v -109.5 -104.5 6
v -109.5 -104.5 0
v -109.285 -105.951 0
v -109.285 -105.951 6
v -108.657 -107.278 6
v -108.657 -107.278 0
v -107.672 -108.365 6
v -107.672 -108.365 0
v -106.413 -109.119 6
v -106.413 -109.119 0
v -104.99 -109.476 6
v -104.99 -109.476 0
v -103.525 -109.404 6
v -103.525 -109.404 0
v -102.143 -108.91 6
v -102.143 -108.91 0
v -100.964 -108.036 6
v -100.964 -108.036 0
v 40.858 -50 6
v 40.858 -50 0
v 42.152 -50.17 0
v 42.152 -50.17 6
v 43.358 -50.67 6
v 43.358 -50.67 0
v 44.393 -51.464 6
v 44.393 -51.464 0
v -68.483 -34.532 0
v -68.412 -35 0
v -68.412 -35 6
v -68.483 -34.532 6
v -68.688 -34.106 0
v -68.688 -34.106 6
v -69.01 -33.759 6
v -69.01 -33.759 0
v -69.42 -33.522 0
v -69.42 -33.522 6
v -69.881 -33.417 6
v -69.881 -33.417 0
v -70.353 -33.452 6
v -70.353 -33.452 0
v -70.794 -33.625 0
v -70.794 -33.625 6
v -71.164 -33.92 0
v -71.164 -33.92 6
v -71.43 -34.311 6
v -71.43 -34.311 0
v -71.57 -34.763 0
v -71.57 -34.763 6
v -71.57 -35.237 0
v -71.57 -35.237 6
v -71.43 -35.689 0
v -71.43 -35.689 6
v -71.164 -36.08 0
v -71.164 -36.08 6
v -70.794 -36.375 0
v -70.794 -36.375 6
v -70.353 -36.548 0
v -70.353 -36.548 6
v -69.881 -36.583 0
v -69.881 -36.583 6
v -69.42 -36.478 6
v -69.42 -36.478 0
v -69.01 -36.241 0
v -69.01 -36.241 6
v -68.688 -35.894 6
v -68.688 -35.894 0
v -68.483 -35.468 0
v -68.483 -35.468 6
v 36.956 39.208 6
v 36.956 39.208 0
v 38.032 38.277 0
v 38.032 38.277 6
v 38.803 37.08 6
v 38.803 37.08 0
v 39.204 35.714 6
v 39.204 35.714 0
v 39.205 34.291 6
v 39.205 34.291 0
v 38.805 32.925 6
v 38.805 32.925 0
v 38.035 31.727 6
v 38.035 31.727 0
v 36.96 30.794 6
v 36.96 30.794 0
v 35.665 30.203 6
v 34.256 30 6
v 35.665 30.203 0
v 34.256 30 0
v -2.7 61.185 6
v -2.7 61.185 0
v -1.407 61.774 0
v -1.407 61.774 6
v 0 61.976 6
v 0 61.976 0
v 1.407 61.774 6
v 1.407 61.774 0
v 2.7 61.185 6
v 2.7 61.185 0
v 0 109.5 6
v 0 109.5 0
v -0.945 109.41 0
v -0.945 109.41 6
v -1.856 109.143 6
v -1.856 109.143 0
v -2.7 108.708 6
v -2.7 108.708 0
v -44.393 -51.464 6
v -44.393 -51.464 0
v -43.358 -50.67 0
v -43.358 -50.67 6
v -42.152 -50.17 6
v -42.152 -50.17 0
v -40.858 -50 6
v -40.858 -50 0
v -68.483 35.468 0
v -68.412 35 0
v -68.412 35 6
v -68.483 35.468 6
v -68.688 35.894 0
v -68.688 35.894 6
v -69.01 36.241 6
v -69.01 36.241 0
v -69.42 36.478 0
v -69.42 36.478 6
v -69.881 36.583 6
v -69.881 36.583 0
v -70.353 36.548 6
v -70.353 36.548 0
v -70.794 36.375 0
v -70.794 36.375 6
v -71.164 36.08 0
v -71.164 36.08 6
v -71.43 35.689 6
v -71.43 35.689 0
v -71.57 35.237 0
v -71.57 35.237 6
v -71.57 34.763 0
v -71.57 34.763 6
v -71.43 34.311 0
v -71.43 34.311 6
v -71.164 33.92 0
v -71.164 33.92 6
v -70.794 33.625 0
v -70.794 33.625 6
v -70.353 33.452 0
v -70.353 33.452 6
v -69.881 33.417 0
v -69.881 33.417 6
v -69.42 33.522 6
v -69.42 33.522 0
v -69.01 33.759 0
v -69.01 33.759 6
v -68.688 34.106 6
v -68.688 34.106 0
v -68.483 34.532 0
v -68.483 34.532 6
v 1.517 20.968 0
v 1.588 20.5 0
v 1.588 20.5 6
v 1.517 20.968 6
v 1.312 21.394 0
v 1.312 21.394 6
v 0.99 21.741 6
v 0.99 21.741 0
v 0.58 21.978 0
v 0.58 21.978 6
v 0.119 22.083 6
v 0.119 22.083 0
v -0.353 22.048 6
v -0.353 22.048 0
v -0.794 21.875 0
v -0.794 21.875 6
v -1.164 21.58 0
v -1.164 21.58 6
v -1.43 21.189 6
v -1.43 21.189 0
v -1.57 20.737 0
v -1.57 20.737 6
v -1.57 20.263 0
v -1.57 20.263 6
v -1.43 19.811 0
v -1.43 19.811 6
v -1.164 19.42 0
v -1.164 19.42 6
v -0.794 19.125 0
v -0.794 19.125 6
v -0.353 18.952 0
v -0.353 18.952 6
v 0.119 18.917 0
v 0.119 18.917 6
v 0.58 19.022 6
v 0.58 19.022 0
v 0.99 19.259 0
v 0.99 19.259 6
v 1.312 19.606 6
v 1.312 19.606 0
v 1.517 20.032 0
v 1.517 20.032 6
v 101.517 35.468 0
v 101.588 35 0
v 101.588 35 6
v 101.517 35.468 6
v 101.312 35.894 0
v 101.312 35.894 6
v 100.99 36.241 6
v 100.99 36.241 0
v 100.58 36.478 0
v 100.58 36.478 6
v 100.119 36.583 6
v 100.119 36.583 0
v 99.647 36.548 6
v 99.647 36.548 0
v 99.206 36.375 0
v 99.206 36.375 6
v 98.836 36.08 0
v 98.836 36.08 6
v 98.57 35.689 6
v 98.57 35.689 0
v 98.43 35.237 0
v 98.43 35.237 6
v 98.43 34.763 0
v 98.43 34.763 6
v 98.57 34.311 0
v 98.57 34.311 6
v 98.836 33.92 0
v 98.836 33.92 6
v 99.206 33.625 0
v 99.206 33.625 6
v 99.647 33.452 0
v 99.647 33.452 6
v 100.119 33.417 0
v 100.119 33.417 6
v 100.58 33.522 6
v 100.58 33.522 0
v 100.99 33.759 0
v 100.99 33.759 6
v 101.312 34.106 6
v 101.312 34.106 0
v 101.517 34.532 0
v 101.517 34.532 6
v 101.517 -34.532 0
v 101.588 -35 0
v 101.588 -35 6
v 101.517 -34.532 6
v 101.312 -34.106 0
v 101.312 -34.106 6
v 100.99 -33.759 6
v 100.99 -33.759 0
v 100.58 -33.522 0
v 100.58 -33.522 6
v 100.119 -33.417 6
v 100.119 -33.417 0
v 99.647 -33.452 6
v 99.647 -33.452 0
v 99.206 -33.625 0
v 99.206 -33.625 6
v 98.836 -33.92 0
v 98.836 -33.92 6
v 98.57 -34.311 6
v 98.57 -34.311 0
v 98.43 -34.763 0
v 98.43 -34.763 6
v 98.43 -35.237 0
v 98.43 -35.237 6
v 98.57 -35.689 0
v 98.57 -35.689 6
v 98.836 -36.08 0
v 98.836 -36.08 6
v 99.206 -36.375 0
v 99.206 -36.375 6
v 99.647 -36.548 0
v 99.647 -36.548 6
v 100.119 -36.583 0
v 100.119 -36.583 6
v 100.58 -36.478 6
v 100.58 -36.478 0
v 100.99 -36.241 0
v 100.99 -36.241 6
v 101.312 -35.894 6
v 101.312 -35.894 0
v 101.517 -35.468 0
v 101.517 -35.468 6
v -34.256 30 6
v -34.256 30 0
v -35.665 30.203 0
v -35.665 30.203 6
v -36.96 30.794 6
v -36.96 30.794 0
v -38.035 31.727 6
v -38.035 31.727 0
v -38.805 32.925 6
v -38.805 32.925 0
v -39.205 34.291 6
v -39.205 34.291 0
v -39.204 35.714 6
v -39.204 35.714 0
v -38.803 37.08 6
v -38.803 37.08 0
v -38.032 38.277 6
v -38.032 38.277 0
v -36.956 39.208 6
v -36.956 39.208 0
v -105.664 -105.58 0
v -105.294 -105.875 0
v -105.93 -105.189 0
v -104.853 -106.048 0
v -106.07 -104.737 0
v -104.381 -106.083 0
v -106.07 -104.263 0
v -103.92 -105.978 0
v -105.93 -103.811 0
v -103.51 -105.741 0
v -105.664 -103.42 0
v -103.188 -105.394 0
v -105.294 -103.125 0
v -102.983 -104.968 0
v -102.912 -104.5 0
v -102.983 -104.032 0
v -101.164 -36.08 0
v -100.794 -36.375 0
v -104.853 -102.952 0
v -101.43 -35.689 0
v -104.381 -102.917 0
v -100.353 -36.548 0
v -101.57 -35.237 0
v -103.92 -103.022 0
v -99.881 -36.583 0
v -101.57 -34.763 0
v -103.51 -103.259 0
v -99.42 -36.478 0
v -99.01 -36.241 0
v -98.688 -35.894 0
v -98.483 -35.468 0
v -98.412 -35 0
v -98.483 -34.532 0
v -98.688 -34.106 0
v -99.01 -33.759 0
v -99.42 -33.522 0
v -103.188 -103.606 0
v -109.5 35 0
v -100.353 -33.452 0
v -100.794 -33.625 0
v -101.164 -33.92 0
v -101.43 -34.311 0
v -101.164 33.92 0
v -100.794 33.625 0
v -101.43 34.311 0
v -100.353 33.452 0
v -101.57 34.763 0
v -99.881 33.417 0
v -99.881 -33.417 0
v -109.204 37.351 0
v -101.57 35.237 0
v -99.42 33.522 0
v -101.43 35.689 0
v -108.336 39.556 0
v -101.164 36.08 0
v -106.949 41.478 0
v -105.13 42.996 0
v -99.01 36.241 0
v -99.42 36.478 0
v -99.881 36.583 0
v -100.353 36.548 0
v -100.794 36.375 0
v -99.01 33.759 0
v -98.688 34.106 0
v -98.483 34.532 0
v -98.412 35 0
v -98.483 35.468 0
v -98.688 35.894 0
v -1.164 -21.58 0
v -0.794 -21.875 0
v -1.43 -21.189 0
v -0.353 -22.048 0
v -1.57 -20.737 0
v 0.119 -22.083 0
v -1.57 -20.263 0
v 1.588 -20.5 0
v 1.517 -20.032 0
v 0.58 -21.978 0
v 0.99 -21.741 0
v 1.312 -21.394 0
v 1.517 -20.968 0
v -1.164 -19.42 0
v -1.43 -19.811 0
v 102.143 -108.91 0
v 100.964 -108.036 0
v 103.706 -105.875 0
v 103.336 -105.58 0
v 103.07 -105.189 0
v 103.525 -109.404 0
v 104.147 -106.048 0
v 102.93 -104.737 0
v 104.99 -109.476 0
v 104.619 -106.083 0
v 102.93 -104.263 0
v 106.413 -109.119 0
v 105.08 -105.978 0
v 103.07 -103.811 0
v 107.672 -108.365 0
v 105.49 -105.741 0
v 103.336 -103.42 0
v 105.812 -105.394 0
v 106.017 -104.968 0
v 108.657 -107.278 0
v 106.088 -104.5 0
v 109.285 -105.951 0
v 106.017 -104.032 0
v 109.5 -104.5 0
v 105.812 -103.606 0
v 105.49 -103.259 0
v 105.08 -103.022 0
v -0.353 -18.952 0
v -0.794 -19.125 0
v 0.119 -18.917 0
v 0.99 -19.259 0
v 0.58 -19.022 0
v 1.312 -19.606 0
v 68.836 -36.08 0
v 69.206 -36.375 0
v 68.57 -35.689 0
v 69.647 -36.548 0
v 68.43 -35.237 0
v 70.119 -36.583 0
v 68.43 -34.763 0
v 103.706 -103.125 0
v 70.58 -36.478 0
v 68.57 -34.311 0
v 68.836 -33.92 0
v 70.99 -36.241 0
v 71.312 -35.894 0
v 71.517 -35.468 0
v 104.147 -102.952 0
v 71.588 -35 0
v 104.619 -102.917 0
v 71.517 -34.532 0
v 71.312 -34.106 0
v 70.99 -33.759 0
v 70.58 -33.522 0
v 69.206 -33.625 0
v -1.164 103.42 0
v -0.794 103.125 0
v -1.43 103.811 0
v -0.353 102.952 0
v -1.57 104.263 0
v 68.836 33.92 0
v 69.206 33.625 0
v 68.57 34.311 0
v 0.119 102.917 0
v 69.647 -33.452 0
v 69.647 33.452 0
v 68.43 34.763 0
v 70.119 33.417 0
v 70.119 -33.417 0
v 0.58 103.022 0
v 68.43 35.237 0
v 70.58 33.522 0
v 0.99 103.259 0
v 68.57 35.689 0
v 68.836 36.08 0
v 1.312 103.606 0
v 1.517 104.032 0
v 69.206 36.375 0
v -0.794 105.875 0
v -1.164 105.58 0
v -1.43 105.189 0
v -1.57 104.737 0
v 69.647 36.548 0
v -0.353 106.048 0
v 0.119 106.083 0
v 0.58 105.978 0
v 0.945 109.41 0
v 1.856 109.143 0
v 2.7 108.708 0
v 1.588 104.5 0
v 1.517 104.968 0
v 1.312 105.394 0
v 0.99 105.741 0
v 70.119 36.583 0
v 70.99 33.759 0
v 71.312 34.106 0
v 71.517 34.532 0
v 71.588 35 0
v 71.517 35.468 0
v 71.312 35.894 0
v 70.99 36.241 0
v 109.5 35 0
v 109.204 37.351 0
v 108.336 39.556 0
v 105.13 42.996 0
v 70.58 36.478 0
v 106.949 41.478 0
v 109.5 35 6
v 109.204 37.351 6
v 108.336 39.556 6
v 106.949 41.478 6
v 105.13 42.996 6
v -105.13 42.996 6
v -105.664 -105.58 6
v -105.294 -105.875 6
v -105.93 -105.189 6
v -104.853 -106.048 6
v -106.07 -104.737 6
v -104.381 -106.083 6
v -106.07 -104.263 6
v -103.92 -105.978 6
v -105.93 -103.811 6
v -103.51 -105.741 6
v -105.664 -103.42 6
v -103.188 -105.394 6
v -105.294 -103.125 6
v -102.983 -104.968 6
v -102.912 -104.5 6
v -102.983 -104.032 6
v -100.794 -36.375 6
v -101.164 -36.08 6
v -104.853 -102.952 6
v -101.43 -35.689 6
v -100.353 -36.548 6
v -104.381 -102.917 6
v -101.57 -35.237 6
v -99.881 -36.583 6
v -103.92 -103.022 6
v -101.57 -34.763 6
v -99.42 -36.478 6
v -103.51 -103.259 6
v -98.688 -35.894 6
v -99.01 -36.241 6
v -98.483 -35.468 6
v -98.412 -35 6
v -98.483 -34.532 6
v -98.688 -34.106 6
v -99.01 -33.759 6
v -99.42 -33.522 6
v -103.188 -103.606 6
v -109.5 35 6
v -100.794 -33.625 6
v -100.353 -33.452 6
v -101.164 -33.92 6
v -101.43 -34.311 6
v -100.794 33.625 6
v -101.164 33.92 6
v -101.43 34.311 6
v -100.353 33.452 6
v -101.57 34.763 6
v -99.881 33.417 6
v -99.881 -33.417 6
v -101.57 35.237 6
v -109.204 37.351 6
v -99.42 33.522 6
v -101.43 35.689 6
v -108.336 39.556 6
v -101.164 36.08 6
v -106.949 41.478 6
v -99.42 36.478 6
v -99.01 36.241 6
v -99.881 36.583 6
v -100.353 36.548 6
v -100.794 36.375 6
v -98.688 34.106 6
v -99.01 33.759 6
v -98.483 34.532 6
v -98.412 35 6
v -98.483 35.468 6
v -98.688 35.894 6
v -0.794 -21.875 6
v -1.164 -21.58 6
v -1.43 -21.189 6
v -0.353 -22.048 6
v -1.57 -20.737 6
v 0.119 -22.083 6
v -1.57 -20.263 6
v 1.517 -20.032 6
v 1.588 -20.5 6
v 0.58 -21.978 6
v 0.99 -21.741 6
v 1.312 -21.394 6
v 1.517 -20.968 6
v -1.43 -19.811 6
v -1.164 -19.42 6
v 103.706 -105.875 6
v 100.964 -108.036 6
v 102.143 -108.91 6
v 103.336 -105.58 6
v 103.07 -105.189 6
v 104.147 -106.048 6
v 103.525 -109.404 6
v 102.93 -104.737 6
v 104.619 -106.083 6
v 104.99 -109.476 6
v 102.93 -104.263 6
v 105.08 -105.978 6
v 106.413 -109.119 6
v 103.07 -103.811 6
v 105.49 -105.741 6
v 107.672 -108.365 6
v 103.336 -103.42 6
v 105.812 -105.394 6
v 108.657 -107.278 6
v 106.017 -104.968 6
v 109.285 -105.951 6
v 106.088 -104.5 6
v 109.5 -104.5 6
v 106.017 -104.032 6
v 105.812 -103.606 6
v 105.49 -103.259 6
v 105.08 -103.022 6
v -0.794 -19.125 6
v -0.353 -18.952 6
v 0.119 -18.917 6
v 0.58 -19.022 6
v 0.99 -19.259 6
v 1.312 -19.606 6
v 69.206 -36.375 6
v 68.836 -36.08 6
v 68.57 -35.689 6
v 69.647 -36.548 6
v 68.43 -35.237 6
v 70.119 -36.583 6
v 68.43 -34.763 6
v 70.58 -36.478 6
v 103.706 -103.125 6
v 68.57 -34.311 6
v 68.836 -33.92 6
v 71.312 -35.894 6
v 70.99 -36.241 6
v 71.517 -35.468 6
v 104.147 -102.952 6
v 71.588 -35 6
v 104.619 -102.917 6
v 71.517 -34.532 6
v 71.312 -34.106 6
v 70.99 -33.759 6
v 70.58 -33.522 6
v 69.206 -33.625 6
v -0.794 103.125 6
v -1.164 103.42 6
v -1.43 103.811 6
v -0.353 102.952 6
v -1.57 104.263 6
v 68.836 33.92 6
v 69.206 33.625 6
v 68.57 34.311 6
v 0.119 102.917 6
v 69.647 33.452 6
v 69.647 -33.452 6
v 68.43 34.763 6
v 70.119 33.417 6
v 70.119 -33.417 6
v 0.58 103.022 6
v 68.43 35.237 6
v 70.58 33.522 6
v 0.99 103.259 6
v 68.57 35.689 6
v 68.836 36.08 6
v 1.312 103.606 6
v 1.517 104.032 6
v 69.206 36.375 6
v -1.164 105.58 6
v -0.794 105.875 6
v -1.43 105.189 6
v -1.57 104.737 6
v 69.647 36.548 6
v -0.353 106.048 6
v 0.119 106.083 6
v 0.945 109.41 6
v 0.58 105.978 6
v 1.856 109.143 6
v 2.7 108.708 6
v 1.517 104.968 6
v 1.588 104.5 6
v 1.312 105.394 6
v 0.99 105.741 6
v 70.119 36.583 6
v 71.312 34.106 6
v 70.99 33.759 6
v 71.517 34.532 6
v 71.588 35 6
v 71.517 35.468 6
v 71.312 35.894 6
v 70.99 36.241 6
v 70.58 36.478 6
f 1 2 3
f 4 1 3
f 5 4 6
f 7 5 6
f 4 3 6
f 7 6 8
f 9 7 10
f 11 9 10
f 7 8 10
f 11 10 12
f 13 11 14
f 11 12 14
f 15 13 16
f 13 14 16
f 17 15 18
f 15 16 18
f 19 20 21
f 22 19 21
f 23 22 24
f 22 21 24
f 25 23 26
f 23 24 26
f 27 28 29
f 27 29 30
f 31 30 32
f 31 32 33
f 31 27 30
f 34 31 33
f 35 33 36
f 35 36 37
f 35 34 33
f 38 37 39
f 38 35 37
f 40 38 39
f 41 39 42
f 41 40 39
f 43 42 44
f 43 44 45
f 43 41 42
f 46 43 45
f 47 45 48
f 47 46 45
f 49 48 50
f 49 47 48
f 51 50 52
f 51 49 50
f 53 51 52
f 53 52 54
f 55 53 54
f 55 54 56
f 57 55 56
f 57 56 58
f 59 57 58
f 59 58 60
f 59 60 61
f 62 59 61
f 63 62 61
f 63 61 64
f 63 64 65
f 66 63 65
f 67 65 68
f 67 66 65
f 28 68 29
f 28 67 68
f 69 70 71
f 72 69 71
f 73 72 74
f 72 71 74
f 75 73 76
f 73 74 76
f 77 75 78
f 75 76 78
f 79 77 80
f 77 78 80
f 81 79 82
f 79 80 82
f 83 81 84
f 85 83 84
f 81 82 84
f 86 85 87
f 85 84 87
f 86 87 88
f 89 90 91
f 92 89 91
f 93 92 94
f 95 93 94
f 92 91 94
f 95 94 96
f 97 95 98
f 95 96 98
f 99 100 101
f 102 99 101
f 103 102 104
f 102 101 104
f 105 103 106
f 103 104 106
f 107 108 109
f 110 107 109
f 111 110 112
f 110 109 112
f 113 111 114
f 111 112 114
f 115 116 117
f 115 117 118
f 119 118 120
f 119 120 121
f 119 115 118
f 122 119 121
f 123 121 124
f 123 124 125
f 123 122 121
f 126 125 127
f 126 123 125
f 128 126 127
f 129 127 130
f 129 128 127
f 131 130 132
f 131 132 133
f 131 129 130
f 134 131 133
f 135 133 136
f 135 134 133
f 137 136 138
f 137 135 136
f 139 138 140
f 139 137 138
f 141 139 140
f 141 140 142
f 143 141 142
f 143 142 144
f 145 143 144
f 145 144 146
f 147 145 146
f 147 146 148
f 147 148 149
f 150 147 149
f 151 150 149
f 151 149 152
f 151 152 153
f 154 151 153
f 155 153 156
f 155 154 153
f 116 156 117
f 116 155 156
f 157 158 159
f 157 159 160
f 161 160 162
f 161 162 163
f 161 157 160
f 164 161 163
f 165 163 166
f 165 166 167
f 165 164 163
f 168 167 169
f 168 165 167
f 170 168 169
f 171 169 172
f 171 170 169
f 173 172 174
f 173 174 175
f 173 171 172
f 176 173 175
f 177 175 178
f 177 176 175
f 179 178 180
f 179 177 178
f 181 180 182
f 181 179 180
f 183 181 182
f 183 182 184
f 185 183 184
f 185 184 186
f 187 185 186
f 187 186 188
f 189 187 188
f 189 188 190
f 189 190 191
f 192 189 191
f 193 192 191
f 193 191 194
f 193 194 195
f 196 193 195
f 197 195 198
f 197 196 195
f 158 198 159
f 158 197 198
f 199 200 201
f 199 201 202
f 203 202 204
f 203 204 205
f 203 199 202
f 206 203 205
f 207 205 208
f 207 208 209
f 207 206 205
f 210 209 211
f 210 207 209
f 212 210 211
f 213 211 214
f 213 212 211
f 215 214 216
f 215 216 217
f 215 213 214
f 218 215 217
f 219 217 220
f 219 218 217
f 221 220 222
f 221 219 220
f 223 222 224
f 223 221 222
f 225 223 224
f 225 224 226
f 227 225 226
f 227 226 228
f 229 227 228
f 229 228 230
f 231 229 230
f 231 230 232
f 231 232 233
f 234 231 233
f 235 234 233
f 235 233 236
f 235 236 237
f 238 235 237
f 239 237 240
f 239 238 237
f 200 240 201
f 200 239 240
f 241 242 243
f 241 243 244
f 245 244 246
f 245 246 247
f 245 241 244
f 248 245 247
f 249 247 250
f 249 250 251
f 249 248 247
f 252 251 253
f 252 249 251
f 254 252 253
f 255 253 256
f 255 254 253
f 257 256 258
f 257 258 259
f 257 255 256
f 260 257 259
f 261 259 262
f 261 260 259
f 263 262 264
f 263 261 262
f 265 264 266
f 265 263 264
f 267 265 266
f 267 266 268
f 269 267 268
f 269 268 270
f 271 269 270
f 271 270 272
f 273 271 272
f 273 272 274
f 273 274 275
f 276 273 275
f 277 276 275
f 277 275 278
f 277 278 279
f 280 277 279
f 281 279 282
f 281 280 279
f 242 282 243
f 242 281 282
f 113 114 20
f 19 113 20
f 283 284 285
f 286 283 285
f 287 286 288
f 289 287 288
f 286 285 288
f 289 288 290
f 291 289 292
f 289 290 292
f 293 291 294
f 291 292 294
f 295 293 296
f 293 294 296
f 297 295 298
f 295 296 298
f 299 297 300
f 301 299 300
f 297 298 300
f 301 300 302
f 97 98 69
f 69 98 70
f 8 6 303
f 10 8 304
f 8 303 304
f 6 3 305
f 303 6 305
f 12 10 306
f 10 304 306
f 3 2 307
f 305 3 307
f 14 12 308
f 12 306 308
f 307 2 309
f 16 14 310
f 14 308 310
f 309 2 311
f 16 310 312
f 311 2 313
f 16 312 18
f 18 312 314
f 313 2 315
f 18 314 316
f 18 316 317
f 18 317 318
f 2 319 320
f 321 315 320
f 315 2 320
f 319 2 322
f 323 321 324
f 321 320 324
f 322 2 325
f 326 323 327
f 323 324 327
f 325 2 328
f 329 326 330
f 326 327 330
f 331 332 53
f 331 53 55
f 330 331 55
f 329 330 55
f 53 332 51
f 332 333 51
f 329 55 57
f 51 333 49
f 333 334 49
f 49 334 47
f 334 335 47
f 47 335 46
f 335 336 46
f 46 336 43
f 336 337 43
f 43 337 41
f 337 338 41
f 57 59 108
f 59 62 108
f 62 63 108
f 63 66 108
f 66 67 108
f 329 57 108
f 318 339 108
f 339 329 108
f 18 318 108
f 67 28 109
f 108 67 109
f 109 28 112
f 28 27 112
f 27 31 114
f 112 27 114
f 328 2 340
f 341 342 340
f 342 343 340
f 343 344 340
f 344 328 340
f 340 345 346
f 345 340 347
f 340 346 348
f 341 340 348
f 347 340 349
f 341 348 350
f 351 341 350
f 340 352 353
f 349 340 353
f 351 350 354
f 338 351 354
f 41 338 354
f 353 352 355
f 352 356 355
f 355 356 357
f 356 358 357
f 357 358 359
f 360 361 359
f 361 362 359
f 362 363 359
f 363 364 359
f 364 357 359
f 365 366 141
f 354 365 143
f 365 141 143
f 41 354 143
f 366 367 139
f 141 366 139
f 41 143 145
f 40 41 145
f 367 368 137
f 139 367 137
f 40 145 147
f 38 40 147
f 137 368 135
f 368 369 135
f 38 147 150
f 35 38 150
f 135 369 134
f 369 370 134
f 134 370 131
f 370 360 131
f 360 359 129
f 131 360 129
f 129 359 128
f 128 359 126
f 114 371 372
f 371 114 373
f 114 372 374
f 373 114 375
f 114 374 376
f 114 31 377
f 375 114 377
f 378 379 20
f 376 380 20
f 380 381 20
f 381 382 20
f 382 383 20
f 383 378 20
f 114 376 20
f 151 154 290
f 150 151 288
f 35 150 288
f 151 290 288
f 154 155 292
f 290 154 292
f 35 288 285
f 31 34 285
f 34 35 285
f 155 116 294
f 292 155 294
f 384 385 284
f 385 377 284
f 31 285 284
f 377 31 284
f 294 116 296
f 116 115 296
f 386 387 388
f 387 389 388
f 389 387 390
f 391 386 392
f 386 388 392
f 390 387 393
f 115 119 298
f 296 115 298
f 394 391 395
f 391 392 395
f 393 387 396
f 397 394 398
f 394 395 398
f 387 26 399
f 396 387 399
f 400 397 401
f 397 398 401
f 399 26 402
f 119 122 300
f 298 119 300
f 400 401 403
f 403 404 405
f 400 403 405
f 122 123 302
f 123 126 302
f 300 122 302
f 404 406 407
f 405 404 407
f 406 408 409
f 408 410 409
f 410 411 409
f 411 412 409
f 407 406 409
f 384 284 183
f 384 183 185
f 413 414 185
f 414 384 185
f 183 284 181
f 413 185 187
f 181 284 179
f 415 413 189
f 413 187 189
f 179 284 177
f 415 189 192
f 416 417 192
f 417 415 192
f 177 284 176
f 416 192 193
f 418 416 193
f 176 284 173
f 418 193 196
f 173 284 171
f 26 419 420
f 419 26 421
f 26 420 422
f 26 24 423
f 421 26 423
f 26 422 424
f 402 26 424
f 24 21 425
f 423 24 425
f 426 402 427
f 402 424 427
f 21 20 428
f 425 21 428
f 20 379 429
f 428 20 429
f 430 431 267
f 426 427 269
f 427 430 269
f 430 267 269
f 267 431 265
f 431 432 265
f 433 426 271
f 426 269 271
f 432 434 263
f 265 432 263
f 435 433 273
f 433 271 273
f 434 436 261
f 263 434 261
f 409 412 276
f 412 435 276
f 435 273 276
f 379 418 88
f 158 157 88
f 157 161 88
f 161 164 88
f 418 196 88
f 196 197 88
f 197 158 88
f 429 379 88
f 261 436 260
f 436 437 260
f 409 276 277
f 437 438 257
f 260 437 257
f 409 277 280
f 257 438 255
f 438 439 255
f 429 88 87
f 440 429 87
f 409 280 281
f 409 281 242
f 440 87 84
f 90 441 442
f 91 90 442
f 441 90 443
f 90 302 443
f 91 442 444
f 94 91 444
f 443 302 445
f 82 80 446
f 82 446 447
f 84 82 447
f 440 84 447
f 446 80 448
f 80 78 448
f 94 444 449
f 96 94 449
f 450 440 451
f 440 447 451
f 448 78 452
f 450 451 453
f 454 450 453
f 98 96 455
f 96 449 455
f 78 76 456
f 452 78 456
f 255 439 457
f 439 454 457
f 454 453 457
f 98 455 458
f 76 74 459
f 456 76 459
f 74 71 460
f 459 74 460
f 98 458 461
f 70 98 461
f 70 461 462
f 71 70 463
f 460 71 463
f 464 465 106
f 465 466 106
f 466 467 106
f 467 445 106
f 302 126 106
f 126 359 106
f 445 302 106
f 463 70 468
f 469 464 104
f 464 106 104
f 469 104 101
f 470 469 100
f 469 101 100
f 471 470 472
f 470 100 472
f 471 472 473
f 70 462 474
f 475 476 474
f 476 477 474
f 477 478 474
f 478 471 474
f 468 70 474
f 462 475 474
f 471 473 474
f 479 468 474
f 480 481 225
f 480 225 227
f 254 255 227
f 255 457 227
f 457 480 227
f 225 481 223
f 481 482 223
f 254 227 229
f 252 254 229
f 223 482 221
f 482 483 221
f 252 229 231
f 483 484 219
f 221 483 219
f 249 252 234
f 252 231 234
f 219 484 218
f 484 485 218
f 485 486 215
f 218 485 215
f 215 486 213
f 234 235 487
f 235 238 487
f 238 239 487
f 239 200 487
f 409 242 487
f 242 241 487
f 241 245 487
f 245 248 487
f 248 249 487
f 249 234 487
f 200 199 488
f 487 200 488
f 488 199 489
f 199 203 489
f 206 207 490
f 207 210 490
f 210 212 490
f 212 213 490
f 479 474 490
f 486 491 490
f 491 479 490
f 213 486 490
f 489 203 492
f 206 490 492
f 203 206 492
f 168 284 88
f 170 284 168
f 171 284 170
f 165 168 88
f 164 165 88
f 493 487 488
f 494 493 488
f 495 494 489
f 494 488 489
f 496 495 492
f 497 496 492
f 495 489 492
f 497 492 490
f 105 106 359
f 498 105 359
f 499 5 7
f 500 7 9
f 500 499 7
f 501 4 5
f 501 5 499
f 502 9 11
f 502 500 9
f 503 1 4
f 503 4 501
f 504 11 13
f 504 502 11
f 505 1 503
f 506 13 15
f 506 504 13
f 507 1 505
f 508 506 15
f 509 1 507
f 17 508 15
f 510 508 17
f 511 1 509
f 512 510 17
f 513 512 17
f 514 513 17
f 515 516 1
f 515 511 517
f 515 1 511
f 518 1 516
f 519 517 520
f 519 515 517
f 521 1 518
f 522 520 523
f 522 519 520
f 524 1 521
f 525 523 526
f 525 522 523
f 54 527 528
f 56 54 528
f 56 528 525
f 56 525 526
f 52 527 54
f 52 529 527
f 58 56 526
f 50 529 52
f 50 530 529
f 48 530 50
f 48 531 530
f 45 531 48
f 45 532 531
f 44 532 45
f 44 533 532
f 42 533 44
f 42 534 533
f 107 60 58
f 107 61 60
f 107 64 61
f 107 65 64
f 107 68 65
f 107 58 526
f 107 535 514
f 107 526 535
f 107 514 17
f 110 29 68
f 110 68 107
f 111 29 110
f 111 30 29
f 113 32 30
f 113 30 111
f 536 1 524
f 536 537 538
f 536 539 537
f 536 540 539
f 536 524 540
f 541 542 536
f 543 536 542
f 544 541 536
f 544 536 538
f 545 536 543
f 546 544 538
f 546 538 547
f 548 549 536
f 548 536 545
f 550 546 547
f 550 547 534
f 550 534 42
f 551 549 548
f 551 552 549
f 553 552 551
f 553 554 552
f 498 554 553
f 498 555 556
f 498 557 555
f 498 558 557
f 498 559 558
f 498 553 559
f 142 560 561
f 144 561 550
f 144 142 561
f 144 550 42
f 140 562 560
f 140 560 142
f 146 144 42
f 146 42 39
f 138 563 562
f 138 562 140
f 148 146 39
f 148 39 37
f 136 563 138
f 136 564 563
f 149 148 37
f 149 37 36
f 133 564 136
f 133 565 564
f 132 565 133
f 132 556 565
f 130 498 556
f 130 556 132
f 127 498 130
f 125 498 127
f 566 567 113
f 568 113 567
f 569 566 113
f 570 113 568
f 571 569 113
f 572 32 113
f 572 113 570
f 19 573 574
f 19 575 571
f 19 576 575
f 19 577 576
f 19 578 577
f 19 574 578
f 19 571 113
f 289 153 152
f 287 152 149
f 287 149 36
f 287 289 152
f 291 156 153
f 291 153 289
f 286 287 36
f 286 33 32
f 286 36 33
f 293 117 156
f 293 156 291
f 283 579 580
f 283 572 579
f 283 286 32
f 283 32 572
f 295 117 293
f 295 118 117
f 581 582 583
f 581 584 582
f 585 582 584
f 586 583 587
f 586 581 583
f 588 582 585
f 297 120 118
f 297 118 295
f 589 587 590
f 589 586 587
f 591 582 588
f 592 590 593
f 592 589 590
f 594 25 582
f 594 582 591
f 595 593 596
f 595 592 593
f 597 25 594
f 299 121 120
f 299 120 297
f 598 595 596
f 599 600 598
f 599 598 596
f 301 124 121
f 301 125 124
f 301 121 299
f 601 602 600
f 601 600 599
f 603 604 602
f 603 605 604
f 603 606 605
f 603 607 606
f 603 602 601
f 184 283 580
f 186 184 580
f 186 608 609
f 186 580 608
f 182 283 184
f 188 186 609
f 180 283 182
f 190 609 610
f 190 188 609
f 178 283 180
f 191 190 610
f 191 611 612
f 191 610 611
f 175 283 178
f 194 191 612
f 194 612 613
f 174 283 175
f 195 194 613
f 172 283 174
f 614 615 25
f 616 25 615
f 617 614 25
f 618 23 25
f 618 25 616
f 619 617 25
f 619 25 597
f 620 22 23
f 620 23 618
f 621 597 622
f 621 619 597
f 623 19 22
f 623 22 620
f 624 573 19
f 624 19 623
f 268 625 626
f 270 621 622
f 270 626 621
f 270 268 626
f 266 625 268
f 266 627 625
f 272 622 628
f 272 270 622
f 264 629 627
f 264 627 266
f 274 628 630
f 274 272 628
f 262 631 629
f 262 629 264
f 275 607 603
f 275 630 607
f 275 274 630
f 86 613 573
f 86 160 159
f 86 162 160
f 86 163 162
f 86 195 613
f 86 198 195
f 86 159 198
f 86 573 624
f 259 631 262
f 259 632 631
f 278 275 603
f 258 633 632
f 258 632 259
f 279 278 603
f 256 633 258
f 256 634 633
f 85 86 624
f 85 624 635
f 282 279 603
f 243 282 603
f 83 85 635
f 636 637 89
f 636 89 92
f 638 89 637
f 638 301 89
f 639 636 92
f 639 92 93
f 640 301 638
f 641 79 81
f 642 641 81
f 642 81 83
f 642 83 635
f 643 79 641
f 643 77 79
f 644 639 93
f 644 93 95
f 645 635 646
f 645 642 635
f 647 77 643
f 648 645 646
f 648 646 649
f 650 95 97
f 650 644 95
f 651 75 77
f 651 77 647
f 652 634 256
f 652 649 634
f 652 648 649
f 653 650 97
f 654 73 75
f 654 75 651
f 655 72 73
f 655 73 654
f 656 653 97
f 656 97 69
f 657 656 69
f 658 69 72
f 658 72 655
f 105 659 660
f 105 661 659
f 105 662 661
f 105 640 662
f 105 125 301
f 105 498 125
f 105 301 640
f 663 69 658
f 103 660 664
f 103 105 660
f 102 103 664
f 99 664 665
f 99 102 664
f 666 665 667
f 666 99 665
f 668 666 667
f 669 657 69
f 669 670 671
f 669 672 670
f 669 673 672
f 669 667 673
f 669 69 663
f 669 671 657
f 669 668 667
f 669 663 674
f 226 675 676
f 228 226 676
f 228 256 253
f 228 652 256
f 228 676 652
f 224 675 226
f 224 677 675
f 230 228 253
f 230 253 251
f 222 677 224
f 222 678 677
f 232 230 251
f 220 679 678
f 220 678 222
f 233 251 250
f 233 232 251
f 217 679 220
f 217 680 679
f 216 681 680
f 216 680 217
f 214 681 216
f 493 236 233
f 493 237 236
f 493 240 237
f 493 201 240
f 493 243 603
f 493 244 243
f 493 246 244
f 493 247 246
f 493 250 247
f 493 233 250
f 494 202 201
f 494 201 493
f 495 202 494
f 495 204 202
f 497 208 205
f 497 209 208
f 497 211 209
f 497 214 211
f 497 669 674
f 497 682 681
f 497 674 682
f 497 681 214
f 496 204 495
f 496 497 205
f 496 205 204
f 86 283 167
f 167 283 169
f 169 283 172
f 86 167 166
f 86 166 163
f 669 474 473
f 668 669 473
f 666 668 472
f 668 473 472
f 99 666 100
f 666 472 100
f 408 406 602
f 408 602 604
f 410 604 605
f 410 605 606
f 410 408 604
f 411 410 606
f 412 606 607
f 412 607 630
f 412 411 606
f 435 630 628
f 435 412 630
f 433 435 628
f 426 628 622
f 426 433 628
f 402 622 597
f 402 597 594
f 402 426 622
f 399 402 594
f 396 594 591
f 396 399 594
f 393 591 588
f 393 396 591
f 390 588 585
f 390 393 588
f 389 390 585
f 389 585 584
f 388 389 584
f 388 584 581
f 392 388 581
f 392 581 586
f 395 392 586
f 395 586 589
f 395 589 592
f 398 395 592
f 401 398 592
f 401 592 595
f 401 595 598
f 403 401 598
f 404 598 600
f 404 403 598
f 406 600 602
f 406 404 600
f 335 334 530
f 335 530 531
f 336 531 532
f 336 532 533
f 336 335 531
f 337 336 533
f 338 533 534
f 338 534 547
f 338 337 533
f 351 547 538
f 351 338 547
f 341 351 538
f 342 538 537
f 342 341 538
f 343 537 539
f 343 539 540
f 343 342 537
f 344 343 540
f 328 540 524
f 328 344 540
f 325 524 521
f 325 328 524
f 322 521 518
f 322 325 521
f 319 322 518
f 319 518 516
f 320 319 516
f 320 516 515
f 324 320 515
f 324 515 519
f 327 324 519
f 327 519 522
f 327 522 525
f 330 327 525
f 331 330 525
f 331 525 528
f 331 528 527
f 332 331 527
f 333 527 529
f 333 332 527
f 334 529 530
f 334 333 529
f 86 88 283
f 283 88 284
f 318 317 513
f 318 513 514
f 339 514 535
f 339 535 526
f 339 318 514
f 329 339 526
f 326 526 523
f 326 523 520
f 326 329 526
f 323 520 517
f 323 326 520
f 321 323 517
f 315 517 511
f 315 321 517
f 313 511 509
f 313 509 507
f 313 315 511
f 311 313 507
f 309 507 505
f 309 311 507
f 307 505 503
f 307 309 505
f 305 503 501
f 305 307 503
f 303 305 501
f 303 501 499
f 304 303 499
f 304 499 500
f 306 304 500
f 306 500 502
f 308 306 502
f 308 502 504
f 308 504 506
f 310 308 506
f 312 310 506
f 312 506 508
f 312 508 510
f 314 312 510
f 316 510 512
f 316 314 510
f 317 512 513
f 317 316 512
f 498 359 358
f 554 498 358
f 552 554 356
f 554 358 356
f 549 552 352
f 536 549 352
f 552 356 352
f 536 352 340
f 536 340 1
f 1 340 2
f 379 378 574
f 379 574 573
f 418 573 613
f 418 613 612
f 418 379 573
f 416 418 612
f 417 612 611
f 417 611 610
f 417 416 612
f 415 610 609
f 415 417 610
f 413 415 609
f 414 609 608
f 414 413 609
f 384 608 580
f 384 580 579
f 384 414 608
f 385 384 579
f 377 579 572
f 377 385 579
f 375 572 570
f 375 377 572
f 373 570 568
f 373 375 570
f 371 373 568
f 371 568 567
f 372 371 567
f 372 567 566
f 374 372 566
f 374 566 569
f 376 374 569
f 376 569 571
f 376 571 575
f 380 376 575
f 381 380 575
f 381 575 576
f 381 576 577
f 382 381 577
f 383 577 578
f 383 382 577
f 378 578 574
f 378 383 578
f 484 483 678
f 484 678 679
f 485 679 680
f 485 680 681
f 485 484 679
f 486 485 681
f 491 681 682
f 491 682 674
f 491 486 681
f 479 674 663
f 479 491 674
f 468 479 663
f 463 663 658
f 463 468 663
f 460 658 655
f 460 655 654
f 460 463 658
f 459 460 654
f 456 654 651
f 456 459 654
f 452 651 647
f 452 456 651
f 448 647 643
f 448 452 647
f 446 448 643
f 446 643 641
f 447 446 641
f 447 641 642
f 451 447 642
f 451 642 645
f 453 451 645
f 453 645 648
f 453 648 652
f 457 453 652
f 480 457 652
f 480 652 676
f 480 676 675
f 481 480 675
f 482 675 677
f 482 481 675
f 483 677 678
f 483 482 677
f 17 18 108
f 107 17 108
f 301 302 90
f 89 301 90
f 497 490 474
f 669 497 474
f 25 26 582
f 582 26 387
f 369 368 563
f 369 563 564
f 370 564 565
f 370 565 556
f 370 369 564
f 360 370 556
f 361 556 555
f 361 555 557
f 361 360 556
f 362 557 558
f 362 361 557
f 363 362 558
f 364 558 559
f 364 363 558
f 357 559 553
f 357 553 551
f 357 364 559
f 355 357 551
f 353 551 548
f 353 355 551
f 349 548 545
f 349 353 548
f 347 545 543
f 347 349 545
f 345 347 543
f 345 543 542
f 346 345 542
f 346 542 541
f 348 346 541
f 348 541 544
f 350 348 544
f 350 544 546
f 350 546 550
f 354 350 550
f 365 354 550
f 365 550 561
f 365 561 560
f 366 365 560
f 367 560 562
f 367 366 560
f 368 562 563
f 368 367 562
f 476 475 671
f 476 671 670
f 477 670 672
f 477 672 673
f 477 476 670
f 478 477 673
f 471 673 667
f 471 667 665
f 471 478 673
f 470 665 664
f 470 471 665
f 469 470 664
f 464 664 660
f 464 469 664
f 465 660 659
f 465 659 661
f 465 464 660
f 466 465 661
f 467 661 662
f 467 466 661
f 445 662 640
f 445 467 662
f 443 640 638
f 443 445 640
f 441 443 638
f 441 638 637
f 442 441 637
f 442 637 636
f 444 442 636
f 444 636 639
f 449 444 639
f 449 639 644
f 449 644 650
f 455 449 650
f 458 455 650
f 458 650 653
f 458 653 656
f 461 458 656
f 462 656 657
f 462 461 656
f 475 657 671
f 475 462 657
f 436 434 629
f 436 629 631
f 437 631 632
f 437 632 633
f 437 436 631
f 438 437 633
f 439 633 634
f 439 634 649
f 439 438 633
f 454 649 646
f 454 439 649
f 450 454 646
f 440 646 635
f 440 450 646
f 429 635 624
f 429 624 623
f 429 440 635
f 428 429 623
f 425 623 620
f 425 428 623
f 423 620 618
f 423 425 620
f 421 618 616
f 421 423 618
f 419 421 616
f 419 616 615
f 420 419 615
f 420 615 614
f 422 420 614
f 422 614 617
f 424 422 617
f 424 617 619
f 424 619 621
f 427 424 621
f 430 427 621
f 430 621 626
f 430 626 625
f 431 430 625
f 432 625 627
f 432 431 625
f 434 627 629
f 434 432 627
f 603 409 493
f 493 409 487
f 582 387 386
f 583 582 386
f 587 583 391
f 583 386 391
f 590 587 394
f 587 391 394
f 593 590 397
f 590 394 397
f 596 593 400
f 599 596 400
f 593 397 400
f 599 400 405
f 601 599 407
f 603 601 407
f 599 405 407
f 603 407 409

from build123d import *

# Parameters (mm, degrees)
F0_R     = 1.5875
F1_DEPTH = 6


with BuildPart() as f1:
    # F0 (on Top) → F1 (new body)
    with BuildSketch(Plane.XY):
        with BuildLine():
            Line((-109.5, 35), (-109.5, -104.5))
            ThreePointArc((-109.5, -104.5), (-106.413417, -109.119398), (-100.964466, -108.035534))
            Line((-100.964466, -108.035534), (-44.393398, -51.464466))
            ThreePointArc((-44.393398, -51.464466), (-42.771282, -50.380602), (-40.857864, -50))
            Line((-40.857864, -50), (0, -50))
            Line((0, -50), (40.857864, -50))
            ThreePointArc((40.857864, -50), (42.771282, -50.380602), (44.393398, -51.464466))
            Line((44.393398, -51.464466), (100.964466, -108.035534))
            ThreePointArc((100.964466, -108.035534), (106.413417, -109.119398), (109.5, -104.5))
            Line((109.5, -104.5), (109.5, 35))
            ThreePointArc((109.5, 35), (108.336136, 39.556187), (105.129719, 42.995998))
            Line((105.129719, 42.995998), (2.699852, 108.70842))
            ThreePointArc((2.699852, 108.70842), (1.406752, 109.298026), (0, 109.5))
            ThreePointArc((0, 109.5), (-1.406752, 109.298026), (-2.699852, 108.70842))
            Line((-2.699852, 108.70842), (-105.129719, 42.995998))
            ThreePointArc((-105.129719, 42.995998), (-108.336136, 39.556187), (-109.5, 35))
        make_face()
        with Locations((-104.5, -104.5)):
            Circle(F0_R, mode=Mode.SUBTRACT)
        with Locations((-100, -35)):
            Circle(F0_R, mode=Mode.SUBTRACT)
        with Locations((-70, -35)):
            Circle(F0_R, mode=Mode.SUBTRACT)
        with Locations((104.5, -104.5)):
            Circle(F0_R, mode=Mode.SUBTRACT)
        with Locations((0, -20.5)):
            Circle(F0_R, mode=Mode.SUBTRACT)
        with Locations((70, -35)):
            Circle(F0_R, mode=Mode.SUBTRACT)
        with Locations((100, -35)):
            Circle(F0_R, mode=Mode.SUBTRACT)
        with Locations((-100, 35)):
            Circle(F0_R, mode=Mode.SUBTRACT)
        with Locations((-70, 35)):
            Circle(F0_R, mode=Mode.SUBTRACT)
        with Locations((0, 20.5)):
            Circle(F0_R, mode=Mode.SUBTRACT)
        with BuildLine():
            Line((34.255654, 30), (0, 30))
            Line((0, 30), (-34.255654, 30))
            ThreePointArc((-34.255654, 30), (-39.05368, 33.593248), (-36.955506, 39.20842))
            Line((-36.955506, 39.20842), (-2.699852, 61.184647))
            ThreePointArc((-2.699852, 61.184647), (0, 61.976227), (2.699852, 61.184647))
            Line((2.699852, 61.184647), (36.955506, 39.20842))
            ThreePointArc((36.955506, 39.20842), (39.05368, 33.593248), (34.255654, 30))
        make_face(mode=Mode.SUBTRACT)
        with Locations((70, 35)):
            Circle(F0_R, mode=Mode.SUBTRACT)
        with Locations((100, 35)):
            Circle(F0_R, mode=Mode.SUBTRACT)
        with Locations((0, 104.5)):
            Circle(F0_R, mode=Mode.SUBTRACT)
    extrude(amount=F1_DEPTH)


solid = f1.part
